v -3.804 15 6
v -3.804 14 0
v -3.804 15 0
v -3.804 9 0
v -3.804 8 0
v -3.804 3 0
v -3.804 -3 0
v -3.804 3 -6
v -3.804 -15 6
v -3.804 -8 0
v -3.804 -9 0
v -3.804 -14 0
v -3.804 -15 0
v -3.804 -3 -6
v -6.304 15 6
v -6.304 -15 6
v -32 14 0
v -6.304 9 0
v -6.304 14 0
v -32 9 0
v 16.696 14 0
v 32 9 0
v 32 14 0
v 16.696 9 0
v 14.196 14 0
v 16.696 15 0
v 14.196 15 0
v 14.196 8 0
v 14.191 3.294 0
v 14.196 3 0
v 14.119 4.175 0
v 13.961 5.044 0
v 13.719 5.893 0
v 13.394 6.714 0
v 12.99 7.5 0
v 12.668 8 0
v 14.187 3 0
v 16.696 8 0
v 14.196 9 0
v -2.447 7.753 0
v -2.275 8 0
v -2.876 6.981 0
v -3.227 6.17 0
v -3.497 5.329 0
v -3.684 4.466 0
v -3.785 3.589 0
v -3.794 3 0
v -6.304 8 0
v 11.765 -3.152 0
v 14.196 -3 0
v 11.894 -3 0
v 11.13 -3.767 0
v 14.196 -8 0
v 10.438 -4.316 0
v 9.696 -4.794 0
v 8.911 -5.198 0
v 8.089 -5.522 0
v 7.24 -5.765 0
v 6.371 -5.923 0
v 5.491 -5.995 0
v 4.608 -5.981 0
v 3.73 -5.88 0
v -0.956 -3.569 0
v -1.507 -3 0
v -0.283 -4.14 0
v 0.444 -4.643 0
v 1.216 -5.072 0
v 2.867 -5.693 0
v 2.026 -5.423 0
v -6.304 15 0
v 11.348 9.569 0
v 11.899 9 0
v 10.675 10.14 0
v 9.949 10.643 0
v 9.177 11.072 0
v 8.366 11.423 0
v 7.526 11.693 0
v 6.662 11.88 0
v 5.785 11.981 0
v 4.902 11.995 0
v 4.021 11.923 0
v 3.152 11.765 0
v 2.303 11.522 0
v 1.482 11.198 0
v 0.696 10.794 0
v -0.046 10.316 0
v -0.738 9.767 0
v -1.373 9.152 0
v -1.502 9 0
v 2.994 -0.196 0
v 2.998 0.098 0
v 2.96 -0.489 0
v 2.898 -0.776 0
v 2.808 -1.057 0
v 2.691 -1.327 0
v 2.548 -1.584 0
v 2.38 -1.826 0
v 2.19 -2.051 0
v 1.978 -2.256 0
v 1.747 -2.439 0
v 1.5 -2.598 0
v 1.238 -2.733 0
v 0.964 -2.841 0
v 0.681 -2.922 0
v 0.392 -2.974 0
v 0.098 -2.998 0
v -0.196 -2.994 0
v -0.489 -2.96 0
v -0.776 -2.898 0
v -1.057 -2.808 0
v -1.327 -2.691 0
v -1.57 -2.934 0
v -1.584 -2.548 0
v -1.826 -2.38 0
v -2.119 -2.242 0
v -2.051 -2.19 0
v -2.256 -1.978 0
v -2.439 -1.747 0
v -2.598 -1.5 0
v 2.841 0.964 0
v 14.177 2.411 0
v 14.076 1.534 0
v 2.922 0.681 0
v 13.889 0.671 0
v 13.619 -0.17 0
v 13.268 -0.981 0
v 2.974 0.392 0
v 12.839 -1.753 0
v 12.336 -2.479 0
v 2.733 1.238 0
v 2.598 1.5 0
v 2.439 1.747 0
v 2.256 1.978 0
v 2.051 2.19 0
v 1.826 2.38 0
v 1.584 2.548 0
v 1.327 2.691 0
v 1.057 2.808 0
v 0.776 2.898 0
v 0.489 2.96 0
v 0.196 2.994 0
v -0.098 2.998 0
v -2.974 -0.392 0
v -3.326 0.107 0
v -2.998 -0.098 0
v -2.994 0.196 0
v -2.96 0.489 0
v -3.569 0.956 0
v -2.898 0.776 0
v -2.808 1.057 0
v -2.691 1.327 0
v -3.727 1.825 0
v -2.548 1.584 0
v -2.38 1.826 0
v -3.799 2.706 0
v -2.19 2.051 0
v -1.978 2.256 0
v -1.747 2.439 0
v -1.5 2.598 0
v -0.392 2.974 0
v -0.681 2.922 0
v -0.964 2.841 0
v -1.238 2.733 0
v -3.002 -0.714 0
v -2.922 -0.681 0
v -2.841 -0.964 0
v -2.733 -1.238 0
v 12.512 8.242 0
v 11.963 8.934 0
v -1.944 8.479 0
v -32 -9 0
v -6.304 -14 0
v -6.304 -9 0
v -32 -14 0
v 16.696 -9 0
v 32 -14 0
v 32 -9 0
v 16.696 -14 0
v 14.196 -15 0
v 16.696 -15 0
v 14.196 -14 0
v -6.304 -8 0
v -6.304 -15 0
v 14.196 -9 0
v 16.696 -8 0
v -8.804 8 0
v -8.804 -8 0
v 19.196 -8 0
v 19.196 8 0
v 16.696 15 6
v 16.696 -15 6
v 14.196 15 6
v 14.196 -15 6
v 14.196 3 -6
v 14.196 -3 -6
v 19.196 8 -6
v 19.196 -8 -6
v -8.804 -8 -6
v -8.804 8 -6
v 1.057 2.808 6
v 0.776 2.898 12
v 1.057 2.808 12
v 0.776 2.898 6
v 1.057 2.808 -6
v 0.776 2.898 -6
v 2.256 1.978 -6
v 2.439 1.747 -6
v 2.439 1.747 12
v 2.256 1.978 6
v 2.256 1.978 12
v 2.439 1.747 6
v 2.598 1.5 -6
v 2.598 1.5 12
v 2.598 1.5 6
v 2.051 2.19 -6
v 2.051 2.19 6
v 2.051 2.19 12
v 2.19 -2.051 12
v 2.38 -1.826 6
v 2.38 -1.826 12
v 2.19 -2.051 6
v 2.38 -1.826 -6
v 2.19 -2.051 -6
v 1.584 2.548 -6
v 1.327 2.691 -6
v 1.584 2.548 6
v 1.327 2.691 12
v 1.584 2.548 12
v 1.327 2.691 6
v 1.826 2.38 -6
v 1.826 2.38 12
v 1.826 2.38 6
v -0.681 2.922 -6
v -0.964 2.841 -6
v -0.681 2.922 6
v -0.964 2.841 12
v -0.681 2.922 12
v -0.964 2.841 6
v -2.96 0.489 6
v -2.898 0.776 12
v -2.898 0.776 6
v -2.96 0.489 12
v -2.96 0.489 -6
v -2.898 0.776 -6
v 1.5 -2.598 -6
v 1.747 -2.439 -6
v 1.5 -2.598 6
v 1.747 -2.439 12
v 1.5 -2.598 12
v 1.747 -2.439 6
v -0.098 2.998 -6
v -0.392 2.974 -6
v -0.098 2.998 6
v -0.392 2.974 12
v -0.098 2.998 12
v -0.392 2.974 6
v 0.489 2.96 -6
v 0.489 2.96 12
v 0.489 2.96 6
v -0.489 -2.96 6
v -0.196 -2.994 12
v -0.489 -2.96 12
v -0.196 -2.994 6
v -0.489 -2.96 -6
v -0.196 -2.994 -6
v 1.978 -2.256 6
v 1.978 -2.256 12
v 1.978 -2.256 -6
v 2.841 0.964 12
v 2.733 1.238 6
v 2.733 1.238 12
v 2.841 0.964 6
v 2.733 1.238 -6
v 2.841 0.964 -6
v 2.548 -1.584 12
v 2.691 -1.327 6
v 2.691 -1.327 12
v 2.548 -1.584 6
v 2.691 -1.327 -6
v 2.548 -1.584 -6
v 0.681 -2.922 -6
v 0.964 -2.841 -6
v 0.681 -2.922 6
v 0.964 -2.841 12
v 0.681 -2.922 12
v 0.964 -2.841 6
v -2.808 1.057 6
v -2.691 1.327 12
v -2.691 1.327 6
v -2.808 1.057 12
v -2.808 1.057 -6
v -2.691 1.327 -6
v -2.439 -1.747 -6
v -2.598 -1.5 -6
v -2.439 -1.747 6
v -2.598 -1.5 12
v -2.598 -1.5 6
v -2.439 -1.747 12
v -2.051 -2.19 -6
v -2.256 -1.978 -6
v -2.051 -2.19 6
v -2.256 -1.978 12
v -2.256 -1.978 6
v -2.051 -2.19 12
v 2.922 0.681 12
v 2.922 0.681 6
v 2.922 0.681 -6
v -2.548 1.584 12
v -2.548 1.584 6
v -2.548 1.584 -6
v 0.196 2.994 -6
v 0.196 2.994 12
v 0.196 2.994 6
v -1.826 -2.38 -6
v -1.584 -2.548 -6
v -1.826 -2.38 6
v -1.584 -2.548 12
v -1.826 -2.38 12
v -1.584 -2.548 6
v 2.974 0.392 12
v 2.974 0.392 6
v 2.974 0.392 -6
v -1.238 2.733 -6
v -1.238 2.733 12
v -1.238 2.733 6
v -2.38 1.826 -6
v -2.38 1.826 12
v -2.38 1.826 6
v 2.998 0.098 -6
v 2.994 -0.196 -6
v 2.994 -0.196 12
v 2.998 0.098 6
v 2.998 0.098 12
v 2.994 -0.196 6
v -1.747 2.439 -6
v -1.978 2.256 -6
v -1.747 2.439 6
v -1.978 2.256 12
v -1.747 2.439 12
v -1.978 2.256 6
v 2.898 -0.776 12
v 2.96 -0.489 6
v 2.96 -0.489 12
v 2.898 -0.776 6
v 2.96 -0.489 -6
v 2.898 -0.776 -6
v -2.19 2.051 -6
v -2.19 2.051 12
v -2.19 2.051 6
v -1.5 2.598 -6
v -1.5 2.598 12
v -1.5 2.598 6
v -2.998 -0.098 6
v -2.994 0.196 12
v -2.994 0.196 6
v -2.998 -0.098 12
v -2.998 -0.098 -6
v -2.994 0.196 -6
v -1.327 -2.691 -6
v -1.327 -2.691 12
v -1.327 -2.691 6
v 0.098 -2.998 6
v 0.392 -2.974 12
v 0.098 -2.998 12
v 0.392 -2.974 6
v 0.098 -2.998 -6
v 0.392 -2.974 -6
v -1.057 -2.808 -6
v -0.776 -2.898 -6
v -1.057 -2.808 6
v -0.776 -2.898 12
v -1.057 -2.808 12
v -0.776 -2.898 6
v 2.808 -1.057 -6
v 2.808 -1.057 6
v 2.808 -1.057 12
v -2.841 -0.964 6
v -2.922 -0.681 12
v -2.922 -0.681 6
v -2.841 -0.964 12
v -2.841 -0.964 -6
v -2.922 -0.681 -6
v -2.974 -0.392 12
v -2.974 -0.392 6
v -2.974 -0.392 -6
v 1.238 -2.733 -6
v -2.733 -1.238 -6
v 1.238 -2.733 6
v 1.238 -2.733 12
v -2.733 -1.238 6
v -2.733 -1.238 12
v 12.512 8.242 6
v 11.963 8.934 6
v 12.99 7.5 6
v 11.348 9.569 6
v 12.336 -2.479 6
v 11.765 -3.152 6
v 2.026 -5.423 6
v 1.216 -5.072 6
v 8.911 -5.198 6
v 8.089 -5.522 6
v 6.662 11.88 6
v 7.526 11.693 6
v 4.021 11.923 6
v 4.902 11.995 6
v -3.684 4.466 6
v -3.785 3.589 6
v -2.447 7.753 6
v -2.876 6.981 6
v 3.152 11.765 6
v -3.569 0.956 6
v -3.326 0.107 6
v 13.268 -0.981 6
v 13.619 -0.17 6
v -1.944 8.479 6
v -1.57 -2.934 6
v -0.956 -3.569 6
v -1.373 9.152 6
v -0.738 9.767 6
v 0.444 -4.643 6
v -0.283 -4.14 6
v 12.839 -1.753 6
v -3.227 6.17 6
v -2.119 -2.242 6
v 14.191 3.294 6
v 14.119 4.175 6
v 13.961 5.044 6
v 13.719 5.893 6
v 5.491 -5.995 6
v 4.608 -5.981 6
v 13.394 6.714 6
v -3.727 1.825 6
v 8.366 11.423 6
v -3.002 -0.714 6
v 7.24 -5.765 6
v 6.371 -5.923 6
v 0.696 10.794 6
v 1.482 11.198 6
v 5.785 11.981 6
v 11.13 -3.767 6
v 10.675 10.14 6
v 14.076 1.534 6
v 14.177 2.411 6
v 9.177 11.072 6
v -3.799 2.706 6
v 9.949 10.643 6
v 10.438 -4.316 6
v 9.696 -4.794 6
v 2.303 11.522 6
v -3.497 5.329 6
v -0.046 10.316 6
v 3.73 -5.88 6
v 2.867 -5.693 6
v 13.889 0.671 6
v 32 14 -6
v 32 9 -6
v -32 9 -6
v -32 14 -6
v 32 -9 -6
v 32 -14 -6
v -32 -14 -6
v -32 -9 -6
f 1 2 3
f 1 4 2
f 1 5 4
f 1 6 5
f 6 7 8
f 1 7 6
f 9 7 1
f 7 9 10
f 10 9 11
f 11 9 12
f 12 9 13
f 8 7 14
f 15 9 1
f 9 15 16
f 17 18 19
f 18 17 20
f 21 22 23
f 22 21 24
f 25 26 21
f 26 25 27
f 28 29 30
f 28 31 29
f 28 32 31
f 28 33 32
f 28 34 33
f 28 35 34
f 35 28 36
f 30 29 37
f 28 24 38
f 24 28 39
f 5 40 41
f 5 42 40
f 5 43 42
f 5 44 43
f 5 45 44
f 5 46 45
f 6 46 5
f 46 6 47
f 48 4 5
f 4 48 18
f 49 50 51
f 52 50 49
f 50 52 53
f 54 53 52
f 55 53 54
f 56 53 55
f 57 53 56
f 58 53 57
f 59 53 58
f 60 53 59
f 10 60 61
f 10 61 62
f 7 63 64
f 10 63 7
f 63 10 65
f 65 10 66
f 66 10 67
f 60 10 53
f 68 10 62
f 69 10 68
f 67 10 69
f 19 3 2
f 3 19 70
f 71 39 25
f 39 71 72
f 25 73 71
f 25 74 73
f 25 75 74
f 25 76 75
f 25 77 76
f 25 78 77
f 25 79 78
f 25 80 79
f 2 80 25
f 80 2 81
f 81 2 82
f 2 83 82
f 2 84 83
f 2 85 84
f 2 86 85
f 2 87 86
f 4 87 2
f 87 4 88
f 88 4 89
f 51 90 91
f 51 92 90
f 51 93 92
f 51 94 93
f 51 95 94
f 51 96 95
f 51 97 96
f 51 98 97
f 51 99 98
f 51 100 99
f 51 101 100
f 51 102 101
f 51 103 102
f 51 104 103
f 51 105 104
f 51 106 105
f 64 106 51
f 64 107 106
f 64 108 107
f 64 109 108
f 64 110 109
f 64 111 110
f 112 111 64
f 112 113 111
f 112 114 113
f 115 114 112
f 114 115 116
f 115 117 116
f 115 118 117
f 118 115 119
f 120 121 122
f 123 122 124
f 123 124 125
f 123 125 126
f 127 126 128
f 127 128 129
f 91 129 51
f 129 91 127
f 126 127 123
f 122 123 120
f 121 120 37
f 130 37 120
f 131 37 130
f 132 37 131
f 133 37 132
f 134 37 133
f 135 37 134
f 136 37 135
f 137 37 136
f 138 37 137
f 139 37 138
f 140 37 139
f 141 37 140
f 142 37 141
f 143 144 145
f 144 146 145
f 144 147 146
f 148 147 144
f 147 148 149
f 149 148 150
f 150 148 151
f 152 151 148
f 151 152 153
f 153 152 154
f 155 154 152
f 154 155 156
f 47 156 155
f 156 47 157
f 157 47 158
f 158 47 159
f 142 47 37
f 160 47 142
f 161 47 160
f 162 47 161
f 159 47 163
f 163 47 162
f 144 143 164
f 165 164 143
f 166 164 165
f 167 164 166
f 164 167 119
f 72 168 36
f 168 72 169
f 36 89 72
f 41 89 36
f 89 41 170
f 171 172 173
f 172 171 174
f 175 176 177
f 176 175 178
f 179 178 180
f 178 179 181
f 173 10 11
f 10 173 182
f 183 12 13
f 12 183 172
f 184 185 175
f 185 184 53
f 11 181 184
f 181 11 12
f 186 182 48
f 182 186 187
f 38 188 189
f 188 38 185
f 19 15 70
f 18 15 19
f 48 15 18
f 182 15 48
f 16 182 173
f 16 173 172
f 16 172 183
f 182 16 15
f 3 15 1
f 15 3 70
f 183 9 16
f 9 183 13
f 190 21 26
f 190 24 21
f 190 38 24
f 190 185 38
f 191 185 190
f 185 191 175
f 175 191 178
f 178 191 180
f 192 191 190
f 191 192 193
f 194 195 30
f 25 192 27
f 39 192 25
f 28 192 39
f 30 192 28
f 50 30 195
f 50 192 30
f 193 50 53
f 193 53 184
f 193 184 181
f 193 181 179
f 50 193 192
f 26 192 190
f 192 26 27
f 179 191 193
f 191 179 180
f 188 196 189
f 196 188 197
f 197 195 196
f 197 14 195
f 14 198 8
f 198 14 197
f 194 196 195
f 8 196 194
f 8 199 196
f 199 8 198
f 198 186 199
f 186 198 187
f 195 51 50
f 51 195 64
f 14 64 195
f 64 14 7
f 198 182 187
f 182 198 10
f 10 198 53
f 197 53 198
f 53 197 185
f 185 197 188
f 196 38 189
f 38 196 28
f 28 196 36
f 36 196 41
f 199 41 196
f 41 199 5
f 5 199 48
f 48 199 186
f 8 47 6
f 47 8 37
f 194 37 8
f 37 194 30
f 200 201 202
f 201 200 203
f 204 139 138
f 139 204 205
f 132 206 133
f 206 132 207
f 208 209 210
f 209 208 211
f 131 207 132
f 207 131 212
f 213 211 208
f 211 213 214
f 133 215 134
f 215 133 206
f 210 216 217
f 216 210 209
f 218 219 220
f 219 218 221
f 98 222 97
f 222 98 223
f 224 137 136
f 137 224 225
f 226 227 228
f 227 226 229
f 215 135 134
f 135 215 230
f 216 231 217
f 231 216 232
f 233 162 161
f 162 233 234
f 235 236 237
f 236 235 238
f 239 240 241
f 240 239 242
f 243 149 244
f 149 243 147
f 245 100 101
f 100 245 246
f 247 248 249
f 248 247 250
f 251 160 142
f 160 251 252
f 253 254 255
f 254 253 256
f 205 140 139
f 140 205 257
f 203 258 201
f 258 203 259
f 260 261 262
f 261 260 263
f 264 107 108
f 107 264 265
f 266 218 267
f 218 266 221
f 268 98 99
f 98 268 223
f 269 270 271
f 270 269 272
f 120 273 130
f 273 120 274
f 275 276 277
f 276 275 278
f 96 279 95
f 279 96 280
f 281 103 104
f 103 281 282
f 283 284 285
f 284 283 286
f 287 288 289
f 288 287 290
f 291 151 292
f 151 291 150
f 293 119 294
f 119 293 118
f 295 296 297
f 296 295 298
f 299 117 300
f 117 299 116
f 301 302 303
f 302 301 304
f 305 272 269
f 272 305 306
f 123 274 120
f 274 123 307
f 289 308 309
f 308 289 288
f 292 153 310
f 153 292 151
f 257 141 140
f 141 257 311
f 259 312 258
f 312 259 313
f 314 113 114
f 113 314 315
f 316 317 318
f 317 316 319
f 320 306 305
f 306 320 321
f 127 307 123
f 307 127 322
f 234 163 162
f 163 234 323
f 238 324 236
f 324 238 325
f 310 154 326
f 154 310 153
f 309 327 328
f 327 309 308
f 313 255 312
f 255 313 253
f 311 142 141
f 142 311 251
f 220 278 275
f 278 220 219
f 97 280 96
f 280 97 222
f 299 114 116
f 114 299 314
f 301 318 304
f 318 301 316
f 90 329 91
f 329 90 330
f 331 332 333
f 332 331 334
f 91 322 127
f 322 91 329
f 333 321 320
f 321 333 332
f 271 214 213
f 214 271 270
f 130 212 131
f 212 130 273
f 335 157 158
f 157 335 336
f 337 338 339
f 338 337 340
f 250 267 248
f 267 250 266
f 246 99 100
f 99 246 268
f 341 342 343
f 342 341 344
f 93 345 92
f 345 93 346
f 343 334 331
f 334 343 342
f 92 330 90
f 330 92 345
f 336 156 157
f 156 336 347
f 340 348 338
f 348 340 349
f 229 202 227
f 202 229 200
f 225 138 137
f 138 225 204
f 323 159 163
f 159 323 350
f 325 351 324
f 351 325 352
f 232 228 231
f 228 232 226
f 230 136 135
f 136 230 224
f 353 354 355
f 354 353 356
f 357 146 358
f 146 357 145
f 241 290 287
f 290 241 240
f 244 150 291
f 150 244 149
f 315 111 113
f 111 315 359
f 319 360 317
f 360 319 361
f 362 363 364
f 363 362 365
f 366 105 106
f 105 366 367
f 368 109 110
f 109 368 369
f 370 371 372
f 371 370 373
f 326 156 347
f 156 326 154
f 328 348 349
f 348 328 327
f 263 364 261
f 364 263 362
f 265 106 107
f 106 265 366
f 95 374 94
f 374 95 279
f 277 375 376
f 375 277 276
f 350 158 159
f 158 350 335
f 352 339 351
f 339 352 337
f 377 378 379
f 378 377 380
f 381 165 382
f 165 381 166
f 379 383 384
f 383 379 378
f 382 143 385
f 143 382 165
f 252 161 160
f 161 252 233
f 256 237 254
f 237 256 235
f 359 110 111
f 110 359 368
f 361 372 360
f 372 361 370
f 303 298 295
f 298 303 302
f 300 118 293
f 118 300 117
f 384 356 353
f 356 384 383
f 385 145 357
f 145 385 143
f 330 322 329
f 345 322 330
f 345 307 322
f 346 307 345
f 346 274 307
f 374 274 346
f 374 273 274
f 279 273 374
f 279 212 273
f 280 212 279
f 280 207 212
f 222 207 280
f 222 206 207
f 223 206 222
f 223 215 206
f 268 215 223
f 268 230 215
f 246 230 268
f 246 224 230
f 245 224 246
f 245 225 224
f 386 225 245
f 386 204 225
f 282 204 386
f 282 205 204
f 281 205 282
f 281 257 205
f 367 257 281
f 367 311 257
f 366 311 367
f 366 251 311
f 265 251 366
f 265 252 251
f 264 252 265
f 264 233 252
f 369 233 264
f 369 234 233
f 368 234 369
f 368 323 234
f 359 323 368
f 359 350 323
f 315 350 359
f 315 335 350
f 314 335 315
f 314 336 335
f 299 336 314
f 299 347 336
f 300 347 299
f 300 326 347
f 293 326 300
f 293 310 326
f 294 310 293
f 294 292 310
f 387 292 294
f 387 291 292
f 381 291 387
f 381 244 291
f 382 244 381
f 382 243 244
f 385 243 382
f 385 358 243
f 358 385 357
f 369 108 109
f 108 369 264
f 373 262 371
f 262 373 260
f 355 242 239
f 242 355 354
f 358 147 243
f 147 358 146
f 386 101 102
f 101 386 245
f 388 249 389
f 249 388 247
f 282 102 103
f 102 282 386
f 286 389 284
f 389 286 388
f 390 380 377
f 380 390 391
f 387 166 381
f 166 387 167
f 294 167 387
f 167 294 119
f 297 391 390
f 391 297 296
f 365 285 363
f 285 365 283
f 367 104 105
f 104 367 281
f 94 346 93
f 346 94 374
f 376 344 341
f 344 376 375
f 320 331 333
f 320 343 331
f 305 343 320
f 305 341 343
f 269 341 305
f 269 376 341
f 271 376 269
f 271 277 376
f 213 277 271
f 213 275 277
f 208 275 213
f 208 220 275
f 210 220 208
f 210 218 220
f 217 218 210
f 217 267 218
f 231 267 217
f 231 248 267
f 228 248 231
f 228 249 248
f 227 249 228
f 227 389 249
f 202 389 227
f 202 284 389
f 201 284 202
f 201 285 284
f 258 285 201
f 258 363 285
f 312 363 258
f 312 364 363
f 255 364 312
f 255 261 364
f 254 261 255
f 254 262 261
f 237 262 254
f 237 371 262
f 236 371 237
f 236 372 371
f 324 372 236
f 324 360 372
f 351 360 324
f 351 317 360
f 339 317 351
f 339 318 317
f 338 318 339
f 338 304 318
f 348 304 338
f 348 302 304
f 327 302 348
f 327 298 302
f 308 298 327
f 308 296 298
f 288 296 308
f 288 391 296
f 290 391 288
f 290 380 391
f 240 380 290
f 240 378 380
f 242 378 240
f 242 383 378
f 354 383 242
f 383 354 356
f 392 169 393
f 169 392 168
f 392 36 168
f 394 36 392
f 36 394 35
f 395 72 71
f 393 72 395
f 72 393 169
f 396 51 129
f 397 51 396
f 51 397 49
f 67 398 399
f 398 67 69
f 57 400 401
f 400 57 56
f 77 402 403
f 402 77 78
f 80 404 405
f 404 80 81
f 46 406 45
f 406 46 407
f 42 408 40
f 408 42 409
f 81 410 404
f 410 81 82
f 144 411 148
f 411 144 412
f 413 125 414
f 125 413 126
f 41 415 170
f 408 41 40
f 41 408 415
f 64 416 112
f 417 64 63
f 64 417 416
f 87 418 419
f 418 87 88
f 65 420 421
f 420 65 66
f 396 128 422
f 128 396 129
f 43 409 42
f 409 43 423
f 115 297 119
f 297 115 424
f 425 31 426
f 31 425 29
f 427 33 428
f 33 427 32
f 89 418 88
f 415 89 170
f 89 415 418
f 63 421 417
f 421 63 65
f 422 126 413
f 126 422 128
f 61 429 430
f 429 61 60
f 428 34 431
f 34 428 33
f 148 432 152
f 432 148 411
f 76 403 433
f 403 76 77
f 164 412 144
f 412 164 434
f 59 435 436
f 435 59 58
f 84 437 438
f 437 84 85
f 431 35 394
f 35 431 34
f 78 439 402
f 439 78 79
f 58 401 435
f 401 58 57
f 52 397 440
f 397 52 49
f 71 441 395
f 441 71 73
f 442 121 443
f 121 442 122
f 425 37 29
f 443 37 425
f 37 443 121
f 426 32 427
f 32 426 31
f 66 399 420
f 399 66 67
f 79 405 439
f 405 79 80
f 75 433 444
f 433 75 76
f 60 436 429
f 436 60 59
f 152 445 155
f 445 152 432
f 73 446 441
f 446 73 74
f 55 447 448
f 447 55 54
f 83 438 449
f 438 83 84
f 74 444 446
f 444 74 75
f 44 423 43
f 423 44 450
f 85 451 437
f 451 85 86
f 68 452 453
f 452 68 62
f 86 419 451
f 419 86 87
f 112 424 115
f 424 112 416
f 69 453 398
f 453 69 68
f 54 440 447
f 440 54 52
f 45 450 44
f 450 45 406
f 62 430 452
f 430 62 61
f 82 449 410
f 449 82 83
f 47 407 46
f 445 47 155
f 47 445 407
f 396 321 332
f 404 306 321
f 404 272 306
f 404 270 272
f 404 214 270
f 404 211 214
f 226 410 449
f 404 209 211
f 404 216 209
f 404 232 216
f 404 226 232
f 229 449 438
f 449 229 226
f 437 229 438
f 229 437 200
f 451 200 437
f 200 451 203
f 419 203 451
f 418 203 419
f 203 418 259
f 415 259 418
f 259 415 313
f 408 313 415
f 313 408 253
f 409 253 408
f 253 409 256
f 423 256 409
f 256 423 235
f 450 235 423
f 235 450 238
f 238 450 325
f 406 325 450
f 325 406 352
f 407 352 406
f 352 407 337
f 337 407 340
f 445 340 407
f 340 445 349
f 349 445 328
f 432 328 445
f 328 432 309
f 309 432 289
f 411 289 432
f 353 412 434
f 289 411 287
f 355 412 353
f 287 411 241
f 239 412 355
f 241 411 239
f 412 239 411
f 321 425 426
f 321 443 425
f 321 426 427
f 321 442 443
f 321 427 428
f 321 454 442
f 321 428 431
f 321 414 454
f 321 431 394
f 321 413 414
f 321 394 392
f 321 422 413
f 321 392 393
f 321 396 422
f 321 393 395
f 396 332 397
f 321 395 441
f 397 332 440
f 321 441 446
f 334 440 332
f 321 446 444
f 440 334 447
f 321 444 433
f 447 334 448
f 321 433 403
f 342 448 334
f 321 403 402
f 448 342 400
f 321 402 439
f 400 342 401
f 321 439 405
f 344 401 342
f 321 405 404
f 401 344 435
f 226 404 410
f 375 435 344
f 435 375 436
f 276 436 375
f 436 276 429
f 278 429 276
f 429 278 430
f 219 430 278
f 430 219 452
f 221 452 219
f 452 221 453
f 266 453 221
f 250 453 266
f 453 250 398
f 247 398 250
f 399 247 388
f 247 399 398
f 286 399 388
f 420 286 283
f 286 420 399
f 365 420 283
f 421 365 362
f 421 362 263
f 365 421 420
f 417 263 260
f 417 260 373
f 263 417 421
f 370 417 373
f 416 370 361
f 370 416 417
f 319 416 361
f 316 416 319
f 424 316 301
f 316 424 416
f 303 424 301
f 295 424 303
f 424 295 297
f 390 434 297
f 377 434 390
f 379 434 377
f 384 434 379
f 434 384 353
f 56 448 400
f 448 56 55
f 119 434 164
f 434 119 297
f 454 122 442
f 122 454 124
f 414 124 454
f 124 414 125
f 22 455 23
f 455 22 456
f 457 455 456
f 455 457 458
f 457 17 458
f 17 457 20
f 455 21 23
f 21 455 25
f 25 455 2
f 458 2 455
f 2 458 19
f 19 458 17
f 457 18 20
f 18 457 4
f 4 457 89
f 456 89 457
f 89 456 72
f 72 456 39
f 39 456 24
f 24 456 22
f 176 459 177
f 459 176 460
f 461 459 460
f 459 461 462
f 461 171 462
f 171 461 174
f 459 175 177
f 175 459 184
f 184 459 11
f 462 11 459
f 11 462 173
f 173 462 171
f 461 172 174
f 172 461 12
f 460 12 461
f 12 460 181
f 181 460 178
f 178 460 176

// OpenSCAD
$time = 30;

h=6;
cr = 9;
mr = 6;
fw = 5;


module OF(){
    translate([-fw/2-(cr-mr),-(cr+mr),0])cube([fw/2,(cr+mr)*2,h]);
    translate([(cr+mr),-(cr+mr),0])cube([fw/2,(cr+mr)*2,h]);

    translate([-fw-(cr-mr),-3-fw,-h])cube([fw*2+cr*2,fw,h]);
    translate([-fw-(cr-mr),3,-h])cube([fw*2+cr*2,fw,h]);
    translate([-fw-(cr-mr),-(3+fw),-h])cube([fw,6+fw*2,h]);
    translate([(cr+mr),-(3+fw),-h])cube([fw,6+fw*2,h]);
}
    


module OC(){
    translate([0,0,-h])cylinder(r=3,h=h*3,$fn=64);
    translate([mr,0,0])cylinder(r=cr,h=h,$fn=64);
}

translate([-fw-(cr-mr)-mr*4,3+fw+1,-h])cube([fw*2+cr*2+mr*6,fw,h]);
translate([-fw-(cr-mr)-mr*4,-3-2*fw-1,-h])cube([fw*2+cr*2+mr*6,fw,h]);

translate([mr*(cos($time)-1),0,0])OF();
rotate([0,0,$time])OC();
